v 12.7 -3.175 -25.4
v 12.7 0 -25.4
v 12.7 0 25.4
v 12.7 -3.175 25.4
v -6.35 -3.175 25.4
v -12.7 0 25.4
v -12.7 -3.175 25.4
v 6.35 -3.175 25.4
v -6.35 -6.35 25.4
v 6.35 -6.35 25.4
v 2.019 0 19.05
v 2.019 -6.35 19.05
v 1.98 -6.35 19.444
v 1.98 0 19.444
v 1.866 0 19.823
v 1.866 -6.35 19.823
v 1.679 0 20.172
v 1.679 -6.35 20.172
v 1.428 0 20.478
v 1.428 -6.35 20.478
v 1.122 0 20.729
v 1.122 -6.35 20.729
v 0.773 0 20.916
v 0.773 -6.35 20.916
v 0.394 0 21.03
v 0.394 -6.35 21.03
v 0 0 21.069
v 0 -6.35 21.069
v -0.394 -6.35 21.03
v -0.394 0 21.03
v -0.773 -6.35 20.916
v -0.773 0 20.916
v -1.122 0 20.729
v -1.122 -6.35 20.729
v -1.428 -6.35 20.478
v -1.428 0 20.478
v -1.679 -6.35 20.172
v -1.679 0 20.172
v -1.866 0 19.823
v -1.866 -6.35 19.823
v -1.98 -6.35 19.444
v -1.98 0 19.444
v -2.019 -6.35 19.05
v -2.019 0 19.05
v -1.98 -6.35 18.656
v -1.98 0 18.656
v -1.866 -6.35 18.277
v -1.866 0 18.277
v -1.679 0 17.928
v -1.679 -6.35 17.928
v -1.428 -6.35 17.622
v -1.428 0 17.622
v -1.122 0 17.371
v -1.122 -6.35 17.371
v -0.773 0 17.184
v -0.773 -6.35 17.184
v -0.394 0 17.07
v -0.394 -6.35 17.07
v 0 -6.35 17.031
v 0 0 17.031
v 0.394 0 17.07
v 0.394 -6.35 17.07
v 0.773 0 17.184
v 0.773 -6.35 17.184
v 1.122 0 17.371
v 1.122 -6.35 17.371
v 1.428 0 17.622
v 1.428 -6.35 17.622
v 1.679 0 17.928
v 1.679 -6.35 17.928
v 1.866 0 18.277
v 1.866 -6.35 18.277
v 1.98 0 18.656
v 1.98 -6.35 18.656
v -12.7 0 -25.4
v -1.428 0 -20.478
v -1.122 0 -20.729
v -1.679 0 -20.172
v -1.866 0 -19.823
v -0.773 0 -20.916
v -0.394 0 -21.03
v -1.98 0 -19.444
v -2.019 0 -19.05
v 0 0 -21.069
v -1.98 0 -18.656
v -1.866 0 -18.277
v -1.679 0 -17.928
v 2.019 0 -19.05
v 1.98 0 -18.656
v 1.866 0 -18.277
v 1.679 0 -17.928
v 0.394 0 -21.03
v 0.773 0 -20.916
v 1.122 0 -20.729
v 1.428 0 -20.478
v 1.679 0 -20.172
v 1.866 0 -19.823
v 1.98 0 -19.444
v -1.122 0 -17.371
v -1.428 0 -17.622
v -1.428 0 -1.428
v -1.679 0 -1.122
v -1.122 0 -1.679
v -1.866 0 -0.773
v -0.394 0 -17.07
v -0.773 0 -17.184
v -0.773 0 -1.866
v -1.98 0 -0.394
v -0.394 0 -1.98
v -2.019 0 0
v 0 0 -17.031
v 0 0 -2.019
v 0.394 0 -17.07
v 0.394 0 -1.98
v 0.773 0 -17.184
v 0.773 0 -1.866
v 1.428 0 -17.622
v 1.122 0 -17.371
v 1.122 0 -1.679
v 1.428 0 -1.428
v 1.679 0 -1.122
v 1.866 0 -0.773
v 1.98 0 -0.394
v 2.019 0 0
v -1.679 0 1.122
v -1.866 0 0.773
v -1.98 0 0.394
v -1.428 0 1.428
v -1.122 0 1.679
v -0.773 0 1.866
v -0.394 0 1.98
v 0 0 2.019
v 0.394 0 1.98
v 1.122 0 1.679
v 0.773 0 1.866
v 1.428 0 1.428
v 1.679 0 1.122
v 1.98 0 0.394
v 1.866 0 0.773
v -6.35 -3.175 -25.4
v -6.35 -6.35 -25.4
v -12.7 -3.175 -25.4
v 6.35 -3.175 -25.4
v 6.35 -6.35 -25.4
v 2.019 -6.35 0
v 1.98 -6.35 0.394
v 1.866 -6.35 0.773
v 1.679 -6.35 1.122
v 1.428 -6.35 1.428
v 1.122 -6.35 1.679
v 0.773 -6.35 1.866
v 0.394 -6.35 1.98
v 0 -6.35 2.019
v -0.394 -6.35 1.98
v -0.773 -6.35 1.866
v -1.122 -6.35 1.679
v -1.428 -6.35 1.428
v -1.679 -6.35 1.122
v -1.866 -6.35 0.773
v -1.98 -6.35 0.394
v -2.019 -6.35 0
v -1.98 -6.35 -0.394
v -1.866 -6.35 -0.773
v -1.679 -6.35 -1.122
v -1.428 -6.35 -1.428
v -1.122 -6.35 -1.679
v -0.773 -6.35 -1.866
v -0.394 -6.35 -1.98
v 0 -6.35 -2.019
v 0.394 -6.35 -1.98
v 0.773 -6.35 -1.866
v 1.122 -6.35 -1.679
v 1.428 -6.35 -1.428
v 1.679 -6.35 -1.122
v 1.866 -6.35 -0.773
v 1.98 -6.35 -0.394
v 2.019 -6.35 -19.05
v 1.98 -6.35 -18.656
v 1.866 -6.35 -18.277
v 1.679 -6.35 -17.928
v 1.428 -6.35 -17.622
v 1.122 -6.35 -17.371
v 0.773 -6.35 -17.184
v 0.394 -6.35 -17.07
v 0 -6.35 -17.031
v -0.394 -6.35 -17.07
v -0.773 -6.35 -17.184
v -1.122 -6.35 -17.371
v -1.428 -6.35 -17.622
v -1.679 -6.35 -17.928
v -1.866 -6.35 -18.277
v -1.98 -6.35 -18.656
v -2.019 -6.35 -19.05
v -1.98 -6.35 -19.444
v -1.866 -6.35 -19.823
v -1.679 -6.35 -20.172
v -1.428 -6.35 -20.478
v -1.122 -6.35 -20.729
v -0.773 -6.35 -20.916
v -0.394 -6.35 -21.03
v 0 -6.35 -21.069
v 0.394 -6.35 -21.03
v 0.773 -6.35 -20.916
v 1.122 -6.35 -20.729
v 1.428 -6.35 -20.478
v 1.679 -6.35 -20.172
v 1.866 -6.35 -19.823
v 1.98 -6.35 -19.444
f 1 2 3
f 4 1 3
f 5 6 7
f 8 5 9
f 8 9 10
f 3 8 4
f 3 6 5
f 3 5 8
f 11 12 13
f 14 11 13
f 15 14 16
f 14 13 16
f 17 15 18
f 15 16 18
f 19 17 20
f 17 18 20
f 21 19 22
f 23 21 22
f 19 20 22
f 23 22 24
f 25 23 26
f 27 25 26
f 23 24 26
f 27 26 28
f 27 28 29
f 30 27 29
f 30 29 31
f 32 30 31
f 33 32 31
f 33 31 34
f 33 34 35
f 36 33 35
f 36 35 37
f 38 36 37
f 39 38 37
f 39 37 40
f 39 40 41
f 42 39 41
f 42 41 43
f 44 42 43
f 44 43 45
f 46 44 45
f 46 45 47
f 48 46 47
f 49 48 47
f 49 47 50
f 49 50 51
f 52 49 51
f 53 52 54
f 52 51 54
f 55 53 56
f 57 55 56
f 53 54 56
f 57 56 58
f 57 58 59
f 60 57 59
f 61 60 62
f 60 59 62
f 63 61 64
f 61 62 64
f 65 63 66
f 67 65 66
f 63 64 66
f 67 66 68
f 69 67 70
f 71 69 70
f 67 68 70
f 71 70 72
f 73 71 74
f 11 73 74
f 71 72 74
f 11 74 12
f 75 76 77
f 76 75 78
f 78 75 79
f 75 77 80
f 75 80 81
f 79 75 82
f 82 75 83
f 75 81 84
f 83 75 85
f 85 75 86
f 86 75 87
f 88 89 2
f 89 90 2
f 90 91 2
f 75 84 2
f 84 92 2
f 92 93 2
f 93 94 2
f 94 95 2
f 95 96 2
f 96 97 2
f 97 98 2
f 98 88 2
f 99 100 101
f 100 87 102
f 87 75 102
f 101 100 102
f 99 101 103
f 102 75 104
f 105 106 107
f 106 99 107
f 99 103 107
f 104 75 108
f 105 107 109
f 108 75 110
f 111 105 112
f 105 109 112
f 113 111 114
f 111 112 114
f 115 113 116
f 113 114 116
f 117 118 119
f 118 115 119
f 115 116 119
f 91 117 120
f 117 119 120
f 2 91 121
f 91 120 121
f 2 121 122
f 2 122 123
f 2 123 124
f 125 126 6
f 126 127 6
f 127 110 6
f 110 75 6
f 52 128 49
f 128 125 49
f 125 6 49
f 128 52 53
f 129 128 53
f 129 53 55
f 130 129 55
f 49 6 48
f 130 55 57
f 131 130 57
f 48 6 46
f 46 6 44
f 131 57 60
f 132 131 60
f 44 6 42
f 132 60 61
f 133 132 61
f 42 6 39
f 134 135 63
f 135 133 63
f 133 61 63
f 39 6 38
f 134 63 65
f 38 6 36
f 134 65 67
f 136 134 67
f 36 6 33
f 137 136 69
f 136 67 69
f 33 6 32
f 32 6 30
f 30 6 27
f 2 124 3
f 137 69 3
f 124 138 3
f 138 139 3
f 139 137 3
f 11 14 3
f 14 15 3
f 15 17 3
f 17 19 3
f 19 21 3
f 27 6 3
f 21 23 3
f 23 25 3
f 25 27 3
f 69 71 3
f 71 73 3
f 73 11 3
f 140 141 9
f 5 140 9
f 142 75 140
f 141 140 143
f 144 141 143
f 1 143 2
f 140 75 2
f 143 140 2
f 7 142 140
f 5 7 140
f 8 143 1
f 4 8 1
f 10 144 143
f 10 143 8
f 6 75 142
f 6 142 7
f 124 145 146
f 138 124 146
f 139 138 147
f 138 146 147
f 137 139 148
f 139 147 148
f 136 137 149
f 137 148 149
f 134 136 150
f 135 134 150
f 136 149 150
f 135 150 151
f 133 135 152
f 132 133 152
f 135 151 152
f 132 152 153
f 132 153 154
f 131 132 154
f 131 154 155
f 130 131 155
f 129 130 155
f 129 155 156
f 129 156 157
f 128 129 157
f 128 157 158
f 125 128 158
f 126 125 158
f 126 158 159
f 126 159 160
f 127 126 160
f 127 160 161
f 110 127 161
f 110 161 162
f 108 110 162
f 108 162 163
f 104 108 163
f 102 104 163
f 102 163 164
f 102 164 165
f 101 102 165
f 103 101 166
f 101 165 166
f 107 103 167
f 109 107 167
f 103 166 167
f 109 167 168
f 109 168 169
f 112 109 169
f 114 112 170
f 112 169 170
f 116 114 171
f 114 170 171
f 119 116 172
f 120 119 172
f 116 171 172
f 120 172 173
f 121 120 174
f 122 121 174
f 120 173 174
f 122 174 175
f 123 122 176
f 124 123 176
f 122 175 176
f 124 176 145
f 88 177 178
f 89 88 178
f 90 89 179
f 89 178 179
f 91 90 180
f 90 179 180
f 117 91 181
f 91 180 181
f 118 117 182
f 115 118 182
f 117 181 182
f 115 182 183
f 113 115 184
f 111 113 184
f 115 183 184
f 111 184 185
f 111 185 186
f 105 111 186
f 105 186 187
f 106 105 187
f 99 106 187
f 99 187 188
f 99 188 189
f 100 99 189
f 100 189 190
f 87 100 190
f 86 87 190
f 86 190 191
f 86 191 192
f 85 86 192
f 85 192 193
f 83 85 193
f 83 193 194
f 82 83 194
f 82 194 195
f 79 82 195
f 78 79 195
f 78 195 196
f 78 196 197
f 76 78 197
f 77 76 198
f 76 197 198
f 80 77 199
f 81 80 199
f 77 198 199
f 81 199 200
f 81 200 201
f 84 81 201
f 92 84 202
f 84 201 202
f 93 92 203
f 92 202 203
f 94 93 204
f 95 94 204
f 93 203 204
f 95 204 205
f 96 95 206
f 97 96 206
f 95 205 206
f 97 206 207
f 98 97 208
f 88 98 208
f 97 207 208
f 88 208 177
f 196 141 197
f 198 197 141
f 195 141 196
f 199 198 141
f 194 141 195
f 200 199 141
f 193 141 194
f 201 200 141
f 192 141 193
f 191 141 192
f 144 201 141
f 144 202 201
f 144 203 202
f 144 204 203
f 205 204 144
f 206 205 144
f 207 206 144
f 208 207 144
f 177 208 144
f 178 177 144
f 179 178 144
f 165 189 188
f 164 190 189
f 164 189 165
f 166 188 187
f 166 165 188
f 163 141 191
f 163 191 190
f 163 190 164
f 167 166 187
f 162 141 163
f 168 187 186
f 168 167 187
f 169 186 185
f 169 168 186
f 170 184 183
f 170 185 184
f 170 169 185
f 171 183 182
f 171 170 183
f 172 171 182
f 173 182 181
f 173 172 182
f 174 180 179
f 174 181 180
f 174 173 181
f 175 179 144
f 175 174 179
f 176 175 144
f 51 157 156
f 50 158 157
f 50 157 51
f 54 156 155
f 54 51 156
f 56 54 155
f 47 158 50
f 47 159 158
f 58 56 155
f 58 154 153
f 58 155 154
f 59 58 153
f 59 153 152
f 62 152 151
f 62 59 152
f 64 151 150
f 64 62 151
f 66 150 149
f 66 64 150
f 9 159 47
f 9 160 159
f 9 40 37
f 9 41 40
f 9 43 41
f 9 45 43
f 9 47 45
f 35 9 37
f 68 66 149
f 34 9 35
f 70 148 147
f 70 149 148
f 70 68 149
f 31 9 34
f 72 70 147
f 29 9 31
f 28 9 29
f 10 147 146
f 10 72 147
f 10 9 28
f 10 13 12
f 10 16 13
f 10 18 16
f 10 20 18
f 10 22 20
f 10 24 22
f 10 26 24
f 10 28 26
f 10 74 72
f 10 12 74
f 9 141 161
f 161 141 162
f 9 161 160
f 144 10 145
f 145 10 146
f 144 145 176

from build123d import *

# Parameters (mm, degrees)
F0_W     = 25.4
F0_H     = 50.8
F1_DEPTH = 6.35
F2_W     = 6.35
F2_H     = 50.8
F3_DEPTH = 3.175
F4_R     = 2.0193
F5_DEPTH = 6.351


with BuildPart() as f1:
    # F0 (on Front) → F1 (new body)
    with BuildSketch(Plane.XZ):
        Rectangle(F0_W, F0_H)
    extrude(amount=F1_DEPTH)

    # F2 (on face) → F3 (cut)
    with BuildSketch(Plane.XZ.offset(6.35)):
        with Locations((-9.525, 0)):
            Rectangle(F2_W, F2_H)
        with Locations((9.525, 0)):
            Rectangle(F2_W, F2_H)
    extrude(amount=-F3_DEPTH, mode=Mode.SUBTRACT)

    # F4 (on face) → F5 (cut, through all)
    with BuildSketch(Plane.XZ.offset(6.35)):
        Circle(F4_R)
        with Locations((0, 19.05)):
            Circle(F4_R)
        with Locations((0, -19.05)):
            Circle(F4_R)
    extrude(amount=-F5_DEPTH, mode=Mode.SUBTRACT)


solid = f1.part
